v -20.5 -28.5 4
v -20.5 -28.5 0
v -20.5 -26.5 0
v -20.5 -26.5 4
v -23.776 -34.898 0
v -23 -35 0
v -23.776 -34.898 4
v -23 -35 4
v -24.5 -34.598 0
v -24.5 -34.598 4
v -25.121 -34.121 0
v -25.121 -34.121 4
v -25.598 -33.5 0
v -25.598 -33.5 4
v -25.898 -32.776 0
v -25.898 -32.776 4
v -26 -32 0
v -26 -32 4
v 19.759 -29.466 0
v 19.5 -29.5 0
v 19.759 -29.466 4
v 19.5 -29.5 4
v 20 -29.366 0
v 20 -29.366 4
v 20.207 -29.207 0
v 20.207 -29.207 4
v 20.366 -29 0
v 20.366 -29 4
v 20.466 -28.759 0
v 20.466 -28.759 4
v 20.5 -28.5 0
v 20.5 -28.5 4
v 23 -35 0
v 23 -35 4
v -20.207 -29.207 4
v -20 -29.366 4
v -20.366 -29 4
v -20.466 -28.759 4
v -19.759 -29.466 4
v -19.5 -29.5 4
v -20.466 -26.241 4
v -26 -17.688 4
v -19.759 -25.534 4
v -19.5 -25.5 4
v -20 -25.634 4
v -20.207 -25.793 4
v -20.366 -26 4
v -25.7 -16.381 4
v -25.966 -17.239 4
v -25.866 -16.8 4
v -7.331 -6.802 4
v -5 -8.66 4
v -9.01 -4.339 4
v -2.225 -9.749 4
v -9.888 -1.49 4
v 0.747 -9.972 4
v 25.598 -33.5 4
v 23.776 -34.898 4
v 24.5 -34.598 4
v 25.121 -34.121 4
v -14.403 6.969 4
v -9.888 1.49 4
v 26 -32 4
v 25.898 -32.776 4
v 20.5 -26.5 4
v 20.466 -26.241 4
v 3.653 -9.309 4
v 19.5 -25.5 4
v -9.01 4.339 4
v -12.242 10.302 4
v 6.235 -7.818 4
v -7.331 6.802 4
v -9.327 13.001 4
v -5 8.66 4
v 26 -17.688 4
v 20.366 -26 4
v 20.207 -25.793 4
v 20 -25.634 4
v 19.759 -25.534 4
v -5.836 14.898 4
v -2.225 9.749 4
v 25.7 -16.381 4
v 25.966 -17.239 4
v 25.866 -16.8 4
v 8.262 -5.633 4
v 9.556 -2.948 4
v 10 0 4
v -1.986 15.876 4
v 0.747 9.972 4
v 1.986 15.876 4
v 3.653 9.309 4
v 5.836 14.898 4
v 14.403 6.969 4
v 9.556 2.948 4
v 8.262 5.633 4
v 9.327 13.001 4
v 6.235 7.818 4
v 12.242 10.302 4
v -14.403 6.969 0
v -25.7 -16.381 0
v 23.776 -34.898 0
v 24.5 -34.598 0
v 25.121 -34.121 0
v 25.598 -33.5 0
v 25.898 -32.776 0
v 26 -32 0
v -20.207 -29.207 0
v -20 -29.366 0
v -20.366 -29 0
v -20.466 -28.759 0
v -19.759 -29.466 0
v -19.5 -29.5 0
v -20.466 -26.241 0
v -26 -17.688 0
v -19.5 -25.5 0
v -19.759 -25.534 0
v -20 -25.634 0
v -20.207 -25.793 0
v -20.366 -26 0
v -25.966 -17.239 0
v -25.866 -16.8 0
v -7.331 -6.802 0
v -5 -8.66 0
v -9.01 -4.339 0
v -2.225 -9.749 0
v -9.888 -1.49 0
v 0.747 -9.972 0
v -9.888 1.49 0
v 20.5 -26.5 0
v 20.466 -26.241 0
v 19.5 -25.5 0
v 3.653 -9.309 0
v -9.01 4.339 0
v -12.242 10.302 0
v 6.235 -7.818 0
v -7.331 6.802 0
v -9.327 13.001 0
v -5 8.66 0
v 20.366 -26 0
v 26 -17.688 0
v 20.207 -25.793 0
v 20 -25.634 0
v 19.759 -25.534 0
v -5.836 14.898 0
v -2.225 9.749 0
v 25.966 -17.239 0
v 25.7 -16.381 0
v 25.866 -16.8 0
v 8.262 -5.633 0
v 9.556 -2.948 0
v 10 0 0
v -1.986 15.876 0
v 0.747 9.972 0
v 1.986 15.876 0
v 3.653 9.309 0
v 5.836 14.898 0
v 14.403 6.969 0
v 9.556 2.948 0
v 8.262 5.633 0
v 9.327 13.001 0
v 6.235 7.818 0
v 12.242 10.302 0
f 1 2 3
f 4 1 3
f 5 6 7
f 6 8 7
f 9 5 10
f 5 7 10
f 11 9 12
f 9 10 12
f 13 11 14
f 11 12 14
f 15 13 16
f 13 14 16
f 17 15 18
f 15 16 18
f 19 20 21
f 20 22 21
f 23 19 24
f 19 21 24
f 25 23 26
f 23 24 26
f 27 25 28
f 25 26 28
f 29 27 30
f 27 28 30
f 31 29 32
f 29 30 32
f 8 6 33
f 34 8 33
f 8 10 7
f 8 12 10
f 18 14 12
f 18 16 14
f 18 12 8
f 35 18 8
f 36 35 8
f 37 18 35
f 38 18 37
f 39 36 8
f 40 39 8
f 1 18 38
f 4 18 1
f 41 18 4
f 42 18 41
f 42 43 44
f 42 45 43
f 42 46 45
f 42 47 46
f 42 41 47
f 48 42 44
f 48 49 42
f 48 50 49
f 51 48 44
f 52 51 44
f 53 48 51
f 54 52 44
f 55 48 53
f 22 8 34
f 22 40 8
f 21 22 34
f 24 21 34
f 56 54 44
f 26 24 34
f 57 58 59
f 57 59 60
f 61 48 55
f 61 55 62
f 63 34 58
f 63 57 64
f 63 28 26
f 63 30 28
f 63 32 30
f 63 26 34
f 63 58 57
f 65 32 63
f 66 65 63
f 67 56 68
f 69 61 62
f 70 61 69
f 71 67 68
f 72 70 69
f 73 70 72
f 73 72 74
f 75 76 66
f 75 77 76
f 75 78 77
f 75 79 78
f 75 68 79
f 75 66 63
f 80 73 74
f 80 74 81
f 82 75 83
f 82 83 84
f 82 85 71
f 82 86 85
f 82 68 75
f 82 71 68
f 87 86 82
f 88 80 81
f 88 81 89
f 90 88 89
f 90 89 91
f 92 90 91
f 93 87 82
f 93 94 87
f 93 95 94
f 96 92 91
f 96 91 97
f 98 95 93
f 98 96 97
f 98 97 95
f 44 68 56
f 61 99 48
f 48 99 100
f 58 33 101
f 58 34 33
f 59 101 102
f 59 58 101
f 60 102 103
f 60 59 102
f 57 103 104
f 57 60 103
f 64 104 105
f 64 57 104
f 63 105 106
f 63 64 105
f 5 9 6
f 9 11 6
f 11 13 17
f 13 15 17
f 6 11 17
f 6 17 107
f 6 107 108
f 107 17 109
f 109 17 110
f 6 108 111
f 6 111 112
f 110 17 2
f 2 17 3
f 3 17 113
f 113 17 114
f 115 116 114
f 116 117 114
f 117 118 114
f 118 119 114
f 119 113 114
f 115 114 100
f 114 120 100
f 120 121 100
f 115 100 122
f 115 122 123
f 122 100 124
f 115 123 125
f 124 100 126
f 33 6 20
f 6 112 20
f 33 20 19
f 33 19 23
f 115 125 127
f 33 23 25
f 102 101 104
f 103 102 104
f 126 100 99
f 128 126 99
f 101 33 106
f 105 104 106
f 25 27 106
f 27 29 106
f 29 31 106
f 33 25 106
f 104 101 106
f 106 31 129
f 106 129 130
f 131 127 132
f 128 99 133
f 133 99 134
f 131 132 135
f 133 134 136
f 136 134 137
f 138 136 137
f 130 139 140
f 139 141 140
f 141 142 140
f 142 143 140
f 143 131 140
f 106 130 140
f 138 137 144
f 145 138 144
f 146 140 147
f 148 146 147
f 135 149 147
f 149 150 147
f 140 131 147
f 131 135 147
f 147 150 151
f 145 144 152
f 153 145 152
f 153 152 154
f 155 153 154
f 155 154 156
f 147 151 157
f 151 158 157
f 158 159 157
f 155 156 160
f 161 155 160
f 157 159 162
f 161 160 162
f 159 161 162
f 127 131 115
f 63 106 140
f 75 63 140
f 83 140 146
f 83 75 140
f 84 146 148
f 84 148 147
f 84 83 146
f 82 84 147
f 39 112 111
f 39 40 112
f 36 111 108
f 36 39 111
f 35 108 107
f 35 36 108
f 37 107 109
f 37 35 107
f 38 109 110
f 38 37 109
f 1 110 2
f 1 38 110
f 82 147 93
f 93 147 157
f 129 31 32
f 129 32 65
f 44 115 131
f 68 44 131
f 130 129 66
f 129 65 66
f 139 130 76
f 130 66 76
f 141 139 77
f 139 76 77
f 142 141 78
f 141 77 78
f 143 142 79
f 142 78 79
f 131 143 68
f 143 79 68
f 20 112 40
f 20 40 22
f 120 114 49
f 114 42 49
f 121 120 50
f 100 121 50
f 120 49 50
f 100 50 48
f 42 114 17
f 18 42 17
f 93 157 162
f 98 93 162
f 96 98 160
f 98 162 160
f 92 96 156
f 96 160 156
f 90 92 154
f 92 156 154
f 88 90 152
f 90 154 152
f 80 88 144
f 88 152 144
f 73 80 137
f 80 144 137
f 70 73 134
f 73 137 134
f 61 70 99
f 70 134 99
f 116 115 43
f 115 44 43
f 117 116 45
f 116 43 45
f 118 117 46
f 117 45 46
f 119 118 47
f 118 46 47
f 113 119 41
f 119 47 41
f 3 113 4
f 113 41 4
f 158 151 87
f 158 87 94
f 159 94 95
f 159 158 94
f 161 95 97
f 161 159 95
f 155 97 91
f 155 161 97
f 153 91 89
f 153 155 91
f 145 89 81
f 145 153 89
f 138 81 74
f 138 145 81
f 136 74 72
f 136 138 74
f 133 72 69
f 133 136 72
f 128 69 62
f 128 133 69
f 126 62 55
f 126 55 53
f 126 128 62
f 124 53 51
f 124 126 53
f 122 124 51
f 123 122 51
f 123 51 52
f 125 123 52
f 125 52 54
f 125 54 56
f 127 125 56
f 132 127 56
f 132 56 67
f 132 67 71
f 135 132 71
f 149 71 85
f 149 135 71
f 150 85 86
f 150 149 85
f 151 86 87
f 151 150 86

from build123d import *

# Parameters (mm, degrees)
SKETCH_1_R      = 10
SKETCH_1_W      = 41
SKETCH_1_H      = 4
EXTRUDE_1_DEPTH = 4
FILLET_3_R      = 3
FILLET_5_R      = 1


with BuildPart() as part:
    # Эскиз1 → Бобышка-Вытянуть1 (new body)
    with BuildSketch(Plane.XY):
        with BuildLine():
            Line((-26, -35), (26, -35))
            Line((26, -35), (26, -17))
            Line((26, -17), (14.402651465, 6.968761064))
            ThreePointArc((14.402651465, 6.968761064), (0, 16), (-14.402651465, 6.968761064))
            Line((-14.402651465, 6.968761064), (-26, -17))
            Line((-26, -17), (-26, -35))
        make_face()
        Circle(SKETCH_1_R, mode=Mode.SUBTRACT)
        with Locations((0, -27.5)):
            Rectangle(SKETCH_1_W, SKETCH_1_H, mode=Mode.SUBTRACT)
    extrude(amount=EXTRUDE_1_DEPTH)

    # Скругление3
    fillet_3_edges = [part.edges().sort_by_distance(p)[0] for p in [
        (-26, -35, 2),
        (-26, -17, 2),
        (26, -17, 2),
        (26, -35, 2),
    ]]
    fillet(fillet_3_edges, radius=FILLET_3_R)

    # Скругление5
    fillet_5_edges = [part.edges().sort_by_distance(p)[0] for p in [
        (-20.5, -25.5, 2),
        (-20.5, -29.5, 2),
        (20.5, -29.5, 2),
        (20.5, -25.5, 2),
    ]]
    fillet(fillet_5_edges, radius=FILLET_5_R)


solid = part.part
